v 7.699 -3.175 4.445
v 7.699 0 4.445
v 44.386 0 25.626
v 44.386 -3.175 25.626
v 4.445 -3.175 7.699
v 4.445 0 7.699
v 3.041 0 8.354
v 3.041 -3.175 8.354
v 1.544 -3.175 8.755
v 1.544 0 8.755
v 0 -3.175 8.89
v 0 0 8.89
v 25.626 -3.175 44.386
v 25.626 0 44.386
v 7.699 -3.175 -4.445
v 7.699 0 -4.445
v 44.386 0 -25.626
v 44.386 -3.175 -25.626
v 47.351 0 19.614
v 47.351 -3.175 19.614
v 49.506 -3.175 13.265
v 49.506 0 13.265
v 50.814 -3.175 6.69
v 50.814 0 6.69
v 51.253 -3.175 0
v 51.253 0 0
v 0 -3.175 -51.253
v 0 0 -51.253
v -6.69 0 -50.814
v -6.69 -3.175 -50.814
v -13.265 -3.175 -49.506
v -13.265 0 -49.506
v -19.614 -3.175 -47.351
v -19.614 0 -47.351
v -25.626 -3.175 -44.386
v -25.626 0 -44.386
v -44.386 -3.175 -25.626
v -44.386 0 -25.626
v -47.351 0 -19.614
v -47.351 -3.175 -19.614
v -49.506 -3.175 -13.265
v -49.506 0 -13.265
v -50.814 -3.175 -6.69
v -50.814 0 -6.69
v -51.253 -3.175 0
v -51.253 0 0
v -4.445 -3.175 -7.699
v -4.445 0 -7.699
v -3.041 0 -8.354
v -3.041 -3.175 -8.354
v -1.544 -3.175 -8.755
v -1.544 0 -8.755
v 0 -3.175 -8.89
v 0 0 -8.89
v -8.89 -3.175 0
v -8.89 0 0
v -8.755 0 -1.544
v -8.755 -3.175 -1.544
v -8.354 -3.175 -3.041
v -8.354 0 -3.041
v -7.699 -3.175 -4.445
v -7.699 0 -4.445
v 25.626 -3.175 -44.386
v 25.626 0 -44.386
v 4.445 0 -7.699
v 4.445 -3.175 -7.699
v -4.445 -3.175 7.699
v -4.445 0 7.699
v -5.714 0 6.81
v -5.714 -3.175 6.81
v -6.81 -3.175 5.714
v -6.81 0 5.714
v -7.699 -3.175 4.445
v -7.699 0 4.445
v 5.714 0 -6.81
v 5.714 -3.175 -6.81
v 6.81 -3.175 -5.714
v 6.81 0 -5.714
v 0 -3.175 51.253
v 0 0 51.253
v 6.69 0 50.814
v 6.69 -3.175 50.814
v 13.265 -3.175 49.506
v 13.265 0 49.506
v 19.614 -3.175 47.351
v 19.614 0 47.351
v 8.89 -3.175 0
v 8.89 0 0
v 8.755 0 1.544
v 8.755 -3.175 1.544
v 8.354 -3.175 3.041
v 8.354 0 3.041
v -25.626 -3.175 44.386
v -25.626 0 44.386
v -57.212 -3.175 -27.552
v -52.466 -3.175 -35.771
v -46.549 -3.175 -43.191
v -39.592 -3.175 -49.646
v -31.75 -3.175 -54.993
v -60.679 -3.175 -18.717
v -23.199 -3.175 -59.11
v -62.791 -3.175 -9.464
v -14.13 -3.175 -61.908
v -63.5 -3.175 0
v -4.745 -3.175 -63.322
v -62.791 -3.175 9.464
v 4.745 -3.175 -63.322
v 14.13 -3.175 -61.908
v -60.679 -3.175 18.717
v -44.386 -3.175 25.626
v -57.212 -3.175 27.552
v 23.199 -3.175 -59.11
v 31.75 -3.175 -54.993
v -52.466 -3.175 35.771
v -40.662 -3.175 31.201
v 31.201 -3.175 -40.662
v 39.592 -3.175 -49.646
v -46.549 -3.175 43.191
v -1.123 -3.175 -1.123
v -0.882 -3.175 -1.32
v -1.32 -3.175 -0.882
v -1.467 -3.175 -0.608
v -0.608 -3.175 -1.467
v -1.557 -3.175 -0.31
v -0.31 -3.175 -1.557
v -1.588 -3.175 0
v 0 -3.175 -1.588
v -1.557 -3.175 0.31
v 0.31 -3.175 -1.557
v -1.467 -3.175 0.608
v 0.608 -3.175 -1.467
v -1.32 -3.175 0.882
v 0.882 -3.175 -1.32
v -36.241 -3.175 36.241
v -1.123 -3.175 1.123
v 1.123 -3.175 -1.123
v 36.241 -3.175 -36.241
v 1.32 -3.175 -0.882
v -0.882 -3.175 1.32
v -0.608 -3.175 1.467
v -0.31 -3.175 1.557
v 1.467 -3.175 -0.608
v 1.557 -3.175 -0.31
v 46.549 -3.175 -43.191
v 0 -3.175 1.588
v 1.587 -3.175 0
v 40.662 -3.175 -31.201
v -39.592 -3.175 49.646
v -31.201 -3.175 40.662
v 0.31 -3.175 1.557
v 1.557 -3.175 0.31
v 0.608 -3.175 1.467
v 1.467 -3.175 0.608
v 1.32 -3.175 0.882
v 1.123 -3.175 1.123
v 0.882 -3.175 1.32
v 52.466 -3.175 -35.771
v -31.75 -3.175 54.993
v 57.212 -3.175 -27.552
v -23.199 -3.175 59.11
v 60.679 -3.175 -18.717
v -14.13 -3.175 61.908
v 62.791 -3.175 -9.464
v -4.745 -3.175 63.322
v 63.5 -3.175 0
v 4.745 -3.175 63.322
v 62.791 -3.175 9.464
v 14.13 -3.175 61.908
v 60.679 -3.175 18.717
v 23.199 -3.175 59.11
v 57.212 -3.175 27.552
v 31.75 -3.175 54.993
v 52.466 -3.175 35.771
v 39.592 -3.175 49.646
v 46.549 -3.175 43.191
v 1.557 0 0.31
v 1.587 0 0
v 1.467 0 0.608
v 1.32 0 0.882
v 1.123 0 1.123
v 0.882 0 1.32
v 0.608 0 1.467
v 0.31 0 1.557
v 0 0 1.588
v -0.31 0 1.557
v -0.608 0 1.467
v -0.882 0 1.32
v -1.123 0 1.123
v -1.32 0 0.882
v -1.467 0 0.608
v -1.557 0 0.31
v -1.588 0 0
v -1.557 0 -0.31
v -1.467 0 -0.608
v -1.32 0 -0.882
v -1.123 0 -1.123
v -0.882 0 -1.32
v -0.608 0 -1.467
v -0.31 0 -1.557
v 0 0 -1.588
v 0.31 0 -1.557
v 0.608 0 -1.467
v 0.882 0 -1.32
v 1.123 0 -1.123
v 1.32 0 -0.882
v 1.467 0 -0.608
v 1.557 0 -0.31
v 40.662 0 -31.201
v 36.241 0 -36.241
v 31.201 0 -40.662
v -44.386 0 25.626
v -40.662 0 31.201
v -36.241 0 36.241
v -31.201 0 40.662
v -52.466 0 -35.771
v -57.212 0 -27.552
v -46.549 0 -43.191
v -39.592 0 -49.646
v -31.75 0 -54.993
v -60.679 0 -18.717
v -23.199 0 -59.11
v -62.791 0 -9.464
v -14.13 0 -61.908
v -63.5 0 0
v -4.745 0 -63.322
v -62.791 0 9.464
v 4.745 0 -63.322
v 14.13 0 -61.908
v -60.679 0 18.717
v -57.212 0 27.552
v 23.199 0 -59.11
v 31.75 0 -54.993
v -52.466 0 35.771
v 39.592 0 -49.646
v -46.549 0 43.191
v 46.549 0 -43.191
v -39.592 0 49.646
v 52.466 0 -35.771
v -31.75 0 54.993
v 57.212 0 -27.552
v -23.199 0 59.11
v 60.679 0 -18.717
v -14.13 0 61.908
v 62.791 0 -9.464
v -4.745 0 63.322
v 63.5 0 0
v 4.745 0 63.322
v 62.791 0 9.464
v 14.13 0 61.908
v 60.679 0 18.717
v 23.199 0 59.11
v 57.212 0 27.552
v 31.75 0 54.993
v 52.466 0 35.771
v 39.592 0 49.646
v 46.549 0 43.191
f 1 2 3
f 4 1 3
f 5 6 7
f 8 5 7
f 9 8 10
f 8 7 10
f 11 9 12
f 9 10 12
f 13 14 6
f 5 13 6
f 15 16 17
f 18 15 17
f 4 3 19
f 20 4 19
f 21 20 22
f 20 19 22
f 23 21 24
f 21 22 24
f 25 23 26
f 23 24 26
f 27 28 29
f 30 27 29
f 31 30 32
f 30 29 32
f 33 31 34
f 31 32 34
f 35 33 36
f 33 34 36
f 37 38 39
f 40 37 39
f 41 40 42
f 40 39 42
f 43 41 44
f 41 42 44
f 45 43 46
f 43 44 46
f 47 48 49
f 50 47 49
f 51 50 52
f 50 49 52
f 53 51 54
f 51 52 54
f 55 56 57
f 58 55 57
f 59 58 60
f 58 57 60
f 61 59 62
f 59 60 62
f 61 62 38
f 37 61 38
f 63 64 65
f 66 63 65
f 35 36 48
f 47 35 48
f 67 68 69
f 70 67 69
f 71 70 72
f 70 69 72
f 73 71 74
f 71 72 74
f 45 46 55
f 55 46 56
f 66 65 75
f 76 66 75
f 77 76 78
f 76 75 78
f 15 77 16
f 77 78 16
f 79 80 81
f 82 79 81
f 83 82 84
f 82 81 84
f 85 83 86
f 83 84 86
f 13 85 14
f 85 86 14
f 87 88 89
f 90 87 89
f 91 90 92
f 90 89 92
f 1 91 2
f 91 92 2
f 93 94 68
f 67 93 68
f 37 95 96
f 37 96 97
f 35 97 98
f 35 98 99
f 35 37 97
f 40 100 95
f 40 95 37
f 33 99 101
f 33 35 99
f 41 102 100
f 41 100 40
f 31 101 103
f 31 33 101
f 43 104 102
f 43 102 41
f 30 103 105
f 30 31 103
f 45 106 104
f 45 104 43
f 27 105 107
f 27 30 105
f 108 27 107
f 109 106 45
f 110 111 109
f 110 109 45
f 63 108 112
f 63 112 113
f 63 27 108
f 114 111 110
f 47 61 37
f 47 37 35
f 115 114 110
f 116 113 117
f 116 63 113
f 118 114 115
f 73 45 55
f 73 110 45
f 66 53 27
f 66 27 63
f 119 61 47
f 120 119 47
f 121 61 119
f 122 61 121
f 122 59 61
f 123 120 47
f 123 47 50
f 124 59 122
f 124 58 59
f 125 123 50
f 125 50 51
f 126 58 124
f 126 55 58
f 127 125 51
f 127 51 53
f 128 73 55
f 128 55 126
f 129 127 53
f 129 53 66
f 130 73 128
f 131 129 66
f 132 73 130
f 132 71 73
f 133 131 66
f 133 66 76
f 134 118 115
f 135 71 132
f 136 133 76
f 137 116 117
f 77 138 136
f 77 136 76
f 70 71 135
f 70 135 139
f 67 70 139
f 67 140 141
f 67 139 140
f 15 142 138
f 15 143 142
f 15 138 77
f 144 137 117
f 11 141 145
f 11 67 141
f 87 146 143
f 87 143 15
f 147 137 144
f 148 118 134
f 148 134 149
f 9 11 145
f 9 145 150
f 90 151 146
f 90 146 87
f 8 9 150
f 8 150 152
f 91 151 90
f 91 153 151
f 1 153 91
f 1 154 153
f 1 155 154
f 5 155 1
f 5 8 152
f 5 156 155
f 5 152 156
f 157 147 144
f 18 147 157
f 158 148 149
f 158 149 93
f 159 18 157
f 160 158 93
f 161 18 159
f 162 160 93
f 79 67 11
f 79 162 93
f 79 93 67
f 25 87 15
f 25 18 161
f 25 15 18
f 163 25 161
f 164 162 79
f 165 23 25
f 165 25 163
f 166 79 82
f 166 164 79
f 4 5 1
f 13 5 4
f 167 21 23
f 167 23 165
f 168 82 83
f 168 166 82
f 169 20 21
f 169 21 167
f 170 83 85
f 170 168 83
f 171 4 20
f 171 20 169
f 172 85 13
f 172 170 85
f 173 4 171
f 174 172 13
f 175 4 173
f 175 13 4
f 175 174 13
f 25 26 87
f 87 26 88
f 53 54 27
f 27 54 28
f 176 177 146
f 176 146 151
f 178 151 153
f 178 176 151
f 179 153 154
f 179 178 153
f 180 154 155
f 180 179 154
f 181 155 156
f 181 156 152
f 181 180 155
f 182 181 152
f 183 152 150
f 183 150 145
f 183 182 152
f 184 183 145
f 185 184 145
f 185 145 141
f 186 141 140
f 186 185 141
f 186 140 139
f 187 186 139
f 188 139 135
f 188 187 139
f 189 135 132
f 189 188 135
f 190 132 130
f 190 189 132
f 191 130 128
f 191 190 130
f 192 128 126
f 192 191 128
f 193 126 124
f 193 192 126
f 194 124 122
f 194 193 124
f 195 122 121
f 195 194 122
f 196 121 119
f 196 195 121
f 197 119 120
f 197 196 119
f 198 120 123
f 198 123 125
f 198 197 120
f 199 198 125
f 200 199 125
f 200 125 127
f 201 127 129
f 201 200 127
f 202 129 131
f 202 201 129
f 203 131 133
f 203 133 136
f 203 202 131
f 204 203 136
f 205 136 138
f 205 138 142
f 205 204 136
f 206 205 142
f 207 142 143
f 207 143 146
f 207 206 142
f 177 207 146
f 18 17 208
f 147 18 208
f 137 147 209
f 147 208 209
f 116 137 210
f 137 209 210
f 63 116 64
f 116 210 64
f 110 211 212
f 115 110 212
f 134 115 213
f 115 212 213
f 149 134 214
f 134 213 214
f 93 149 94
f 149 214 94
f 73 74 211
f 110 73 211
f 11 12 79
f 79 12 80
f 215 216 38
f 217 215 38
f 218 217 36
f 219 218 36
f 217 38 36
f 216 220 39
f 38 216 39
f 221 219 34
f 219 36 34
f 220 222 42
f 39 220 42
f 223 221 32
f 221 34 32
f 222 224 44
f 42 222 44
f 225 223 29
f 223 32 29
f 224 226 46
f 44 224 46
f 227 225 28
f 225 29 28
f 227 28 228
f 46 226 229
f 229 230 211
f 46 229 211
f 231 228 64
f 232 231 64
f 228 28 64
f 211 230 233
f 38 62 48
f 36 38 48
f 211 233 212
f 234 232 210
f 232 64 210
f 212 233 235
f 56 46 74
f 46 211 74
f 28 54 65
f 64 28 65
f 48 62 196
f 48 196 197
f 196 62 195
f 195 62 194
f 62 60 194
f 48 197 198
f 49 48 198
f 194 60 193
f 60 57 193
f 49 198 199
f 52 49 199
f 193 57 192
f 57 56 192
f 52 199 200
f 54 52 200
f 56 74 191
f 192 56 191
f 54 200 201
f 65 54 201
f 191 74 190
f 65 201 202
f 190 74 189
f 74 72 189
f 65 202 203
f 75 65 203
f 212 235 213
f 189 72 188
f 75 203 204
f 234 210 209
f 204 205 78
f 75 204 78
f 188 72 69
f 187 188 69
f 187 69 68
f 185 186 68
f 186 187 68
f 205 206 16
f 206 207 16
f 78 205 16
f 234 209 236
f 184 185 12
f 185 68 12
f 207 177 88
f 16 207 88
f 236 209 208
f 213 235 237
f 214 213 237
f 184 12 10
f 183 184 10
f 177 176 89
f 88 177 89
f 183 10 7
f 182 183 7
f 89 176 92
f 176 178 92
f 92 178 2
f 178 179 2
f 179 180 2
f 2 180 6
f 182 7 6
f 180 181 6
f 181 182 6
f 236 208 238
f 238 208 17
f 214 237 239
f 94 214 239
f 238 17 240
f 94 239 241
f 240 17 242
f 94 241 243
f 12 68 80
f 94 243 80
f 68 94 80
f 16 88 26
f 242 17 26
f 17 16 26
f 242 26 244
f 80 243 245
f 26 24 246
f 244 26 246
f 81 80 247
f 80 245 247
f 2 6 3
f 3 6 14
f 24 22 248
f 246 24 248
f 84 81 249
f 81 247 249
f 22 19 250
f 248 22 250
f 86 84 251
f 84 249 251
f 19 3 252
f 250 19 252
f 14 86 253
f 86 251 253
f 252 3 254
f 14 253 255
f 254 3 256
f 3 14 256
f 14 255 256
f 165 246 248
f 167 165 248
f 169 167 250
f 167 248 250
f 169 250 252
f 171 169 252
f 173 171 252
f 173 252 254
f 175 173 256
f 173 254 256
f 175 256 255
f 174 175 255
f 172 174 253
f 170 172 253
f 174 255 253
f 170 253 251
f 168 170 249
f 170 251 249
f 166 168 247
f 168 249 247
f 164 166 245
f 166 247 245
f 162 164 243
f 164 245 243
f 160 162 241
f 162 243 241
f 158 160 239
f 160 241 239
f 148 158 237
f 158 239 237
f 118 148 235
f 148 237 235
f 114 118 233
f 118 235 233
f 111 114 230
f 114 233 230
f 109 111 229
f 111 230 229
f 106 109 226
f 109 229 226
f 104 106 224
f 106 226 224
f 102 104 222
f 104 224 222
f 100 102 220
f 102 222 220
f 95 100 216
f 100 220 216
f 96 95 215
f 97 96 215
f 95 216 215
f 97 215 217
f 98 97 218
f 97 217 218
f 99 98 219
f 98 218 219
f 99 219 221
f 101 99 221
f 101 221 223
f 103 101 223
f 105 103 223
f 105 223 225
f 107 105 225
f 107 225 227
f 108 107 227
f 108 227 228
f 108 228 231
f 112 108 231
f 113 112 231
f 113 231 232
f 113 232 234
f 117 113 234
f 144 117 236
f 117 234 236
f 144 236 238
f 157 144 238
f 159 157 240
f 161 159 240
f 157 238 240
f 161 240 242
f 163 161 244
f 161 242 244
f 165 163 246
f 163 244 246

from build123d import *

# Parameters (mm, degrees)
F0_R     = 63.5
F0_R_2   = 1.5875
F1_DEPTH = 3.175
F2_R     = 1.5875
F3_DEPTH = 3.175


with BuildPart() as f1:
    # F0 (on Front) → F1 (new body)
    with BuildSketch(Plane.XZ):
        Circle(F0_R)
        with BuildLine():
            ThreePointArc((44.386194, 25.626381), (49.506367, 13.265191), (51.252762, 0))
            ThreePointArc((51.252762, 0), (49.506367, -13.265191), (44.386194, -25.626381))
            ThreePointArc((44.386194, -25.626381), (36.241176, -36.241176), (25.626381, -44.386194))
            ThreePointArc((25.626381, -44.386194), (13.265191, -49.506367), (0, -51.252762))
            ThreePointArc((0, -51.252762), (-13.265191, -49.506367), (-25.626381, -44.386194))
            ThreePointArc((-25.626381, -44.386194), (-36.241176, -36.241176), (-44.386194, -25.626381))
            ThreePointArc((-44.386194, -25.626381), (-49.506367, -13.265191), (-51.252762, 0))
            ThreePointArc((-51.252762, 0), (-49.506367, 13.265191), (-44.386194, 25.626381))
            ThreePointArc((-44.386194, 25.626381), (-36.241176, 36.241176), (-25.626381, 44.386194))
            ThreePointArc((-25.626381, 44.386194), (-13.265191, 49.506367), (0, 51.252762))
            ThreePointArc((0, 51.252762), (13.265191, 49.506367), (25.626381, 44.386194))
            ThreePointArc((25.626381, 44.386194), (36.241176, 36.241176), (44.386194, 25.626381))
        make_face(mode=Mode.SUBTRACT)
        with BuildLine():
            Line((-7.698966, 4.445), (-44.386194, 25.626381))
            ThreePointArc((-44.386194, 25.626381), (-49.506367, 13.265191), (-51.252762, 0))
            Line((-51.252762, 0), (-8.89, 0))
            ThreePointArc((-8.89, 0), (-8.587081, 2.300901), (-7.698966, 4.445))
        make_face()
        with BuildLine():
            Line((0, 8.89), (0, 51.252762))
            ThreePointArc((0, 51.252762), (-13.265191, 49.506367), (-25.626381, 44.386194))
            Line((-25.626381, 44.386194), (-4.445, 7.698966))
            ThreePointArc((-4.445, 7.698966), (-2.300901, 8.587081), (0, 8.89))
        make_face()
        with BuildLine():
            Line((7.698966, 4.445), (44.386194, 25.626381))
            ThreePointArc((44.386194, 25.626381), (36.241176, 36.241176), (25.626381, 44.386194))
            Line((25.626381, 44.386194), (4.445, 7.698966))
            ThreePointArc((4.445, 7.698966), (6.286179, 6.286179), (7.698966, 4.445))
        make_face()
        with BuildLine():
            ThreePointArc((44.386194, -25.626381), (49.506367, -13.265191), (51.252762, 0))
            Line((51.252762, 0), (8.89, 0))
            ThreePointArc((8.89, 0), (8.587081, -2.300901), (7.698966, -4.445))
            Line((7.698966, -4.445), (44.386194, -25.626381))
        make_face()
        with BuildLine():
            ThreePointArc((0, -51.252762), (13.265191, -49.506367), (25.626381, -44.386194))
            Line((25.626381, -44.386194), (4.445, -7.698966))
            ThreePointArc((4.445, -7.698966), (2.300901, -8.587081), (0, -8.89))
            Line((0, -8.89), (0, -51.252762))
        make_face()
        with BuildLine():
            ThreePointArc((-44.386194, -25.626381), (-36.241176, -36.241176), (-25.626381, -44.386194))
            Line((-25.626381, -44.386194), (-4.445, -7.698966))
            ThreePointArc((-4.445, -7.698966), (-6.286179, -6.286179), (-7.698966, -4.445))
            Line((-7.698966, -4.445), (-44.386194, -25.626381))
        make_face()
        with BuildLine():
            ThreePointArc((7.698966, -4.445), (8.587081, -2.300901), (8.89, 0))
            ThreePointArc((8.89, 0), (8.587081, 2.300901), (7.698966, 4.445))
            ThreePointArc((7.698966, 4.445), (6.286179, 6.286179), (4.445, 7.698966))
            ThreePointArc((4.445, 7.698966), (2.300901, 8.587081), (0, 8.89))
            ThreePointArc((0, 8.89), (-2.300901, 8.587081), (-4.445, 7.698966))
            ThreePointArc((-4.445, 7.698966), (-6.286179, 6.286179), (-7.698966, 4.445))
            ThreePointArc((-7.698966, 4.445), (-8.587081, 2.300901), (-8.89, 0))
            ThreePointArc((-8.89, 0), (-8.587081, -2.300901), (-7.698966, -4.445))
            ThreePointArc((-7.698966, -4.445), (-6.286179, -6.286179), (-4.445, -7.698966))
            ThreePointArc((-4.445, -7.698966), (-2.300901, -8.587081), (0, -8.89))
            ThreePointArc((0, -8.89), (2.300901, -8.587081), (4.445, -7.698966))
            ThreePointArc((4.445, -7.698966), (6.286179, -6.286179), (7.698966, -4.445))
        make_face()
        Circle(F0_R_2, mode=Mode.SUBTRACT)
    extrude(amount=F1_DEPTH)

    # F2 (on face) → F3 (cut)
    with BuildSketch(Plane.XZ.offset(3.175)):
        Circle(F2_R)
    extrude(amount=-F3_DEPTH, mode=Mode.SUBTRACT)


solid = f1.part
